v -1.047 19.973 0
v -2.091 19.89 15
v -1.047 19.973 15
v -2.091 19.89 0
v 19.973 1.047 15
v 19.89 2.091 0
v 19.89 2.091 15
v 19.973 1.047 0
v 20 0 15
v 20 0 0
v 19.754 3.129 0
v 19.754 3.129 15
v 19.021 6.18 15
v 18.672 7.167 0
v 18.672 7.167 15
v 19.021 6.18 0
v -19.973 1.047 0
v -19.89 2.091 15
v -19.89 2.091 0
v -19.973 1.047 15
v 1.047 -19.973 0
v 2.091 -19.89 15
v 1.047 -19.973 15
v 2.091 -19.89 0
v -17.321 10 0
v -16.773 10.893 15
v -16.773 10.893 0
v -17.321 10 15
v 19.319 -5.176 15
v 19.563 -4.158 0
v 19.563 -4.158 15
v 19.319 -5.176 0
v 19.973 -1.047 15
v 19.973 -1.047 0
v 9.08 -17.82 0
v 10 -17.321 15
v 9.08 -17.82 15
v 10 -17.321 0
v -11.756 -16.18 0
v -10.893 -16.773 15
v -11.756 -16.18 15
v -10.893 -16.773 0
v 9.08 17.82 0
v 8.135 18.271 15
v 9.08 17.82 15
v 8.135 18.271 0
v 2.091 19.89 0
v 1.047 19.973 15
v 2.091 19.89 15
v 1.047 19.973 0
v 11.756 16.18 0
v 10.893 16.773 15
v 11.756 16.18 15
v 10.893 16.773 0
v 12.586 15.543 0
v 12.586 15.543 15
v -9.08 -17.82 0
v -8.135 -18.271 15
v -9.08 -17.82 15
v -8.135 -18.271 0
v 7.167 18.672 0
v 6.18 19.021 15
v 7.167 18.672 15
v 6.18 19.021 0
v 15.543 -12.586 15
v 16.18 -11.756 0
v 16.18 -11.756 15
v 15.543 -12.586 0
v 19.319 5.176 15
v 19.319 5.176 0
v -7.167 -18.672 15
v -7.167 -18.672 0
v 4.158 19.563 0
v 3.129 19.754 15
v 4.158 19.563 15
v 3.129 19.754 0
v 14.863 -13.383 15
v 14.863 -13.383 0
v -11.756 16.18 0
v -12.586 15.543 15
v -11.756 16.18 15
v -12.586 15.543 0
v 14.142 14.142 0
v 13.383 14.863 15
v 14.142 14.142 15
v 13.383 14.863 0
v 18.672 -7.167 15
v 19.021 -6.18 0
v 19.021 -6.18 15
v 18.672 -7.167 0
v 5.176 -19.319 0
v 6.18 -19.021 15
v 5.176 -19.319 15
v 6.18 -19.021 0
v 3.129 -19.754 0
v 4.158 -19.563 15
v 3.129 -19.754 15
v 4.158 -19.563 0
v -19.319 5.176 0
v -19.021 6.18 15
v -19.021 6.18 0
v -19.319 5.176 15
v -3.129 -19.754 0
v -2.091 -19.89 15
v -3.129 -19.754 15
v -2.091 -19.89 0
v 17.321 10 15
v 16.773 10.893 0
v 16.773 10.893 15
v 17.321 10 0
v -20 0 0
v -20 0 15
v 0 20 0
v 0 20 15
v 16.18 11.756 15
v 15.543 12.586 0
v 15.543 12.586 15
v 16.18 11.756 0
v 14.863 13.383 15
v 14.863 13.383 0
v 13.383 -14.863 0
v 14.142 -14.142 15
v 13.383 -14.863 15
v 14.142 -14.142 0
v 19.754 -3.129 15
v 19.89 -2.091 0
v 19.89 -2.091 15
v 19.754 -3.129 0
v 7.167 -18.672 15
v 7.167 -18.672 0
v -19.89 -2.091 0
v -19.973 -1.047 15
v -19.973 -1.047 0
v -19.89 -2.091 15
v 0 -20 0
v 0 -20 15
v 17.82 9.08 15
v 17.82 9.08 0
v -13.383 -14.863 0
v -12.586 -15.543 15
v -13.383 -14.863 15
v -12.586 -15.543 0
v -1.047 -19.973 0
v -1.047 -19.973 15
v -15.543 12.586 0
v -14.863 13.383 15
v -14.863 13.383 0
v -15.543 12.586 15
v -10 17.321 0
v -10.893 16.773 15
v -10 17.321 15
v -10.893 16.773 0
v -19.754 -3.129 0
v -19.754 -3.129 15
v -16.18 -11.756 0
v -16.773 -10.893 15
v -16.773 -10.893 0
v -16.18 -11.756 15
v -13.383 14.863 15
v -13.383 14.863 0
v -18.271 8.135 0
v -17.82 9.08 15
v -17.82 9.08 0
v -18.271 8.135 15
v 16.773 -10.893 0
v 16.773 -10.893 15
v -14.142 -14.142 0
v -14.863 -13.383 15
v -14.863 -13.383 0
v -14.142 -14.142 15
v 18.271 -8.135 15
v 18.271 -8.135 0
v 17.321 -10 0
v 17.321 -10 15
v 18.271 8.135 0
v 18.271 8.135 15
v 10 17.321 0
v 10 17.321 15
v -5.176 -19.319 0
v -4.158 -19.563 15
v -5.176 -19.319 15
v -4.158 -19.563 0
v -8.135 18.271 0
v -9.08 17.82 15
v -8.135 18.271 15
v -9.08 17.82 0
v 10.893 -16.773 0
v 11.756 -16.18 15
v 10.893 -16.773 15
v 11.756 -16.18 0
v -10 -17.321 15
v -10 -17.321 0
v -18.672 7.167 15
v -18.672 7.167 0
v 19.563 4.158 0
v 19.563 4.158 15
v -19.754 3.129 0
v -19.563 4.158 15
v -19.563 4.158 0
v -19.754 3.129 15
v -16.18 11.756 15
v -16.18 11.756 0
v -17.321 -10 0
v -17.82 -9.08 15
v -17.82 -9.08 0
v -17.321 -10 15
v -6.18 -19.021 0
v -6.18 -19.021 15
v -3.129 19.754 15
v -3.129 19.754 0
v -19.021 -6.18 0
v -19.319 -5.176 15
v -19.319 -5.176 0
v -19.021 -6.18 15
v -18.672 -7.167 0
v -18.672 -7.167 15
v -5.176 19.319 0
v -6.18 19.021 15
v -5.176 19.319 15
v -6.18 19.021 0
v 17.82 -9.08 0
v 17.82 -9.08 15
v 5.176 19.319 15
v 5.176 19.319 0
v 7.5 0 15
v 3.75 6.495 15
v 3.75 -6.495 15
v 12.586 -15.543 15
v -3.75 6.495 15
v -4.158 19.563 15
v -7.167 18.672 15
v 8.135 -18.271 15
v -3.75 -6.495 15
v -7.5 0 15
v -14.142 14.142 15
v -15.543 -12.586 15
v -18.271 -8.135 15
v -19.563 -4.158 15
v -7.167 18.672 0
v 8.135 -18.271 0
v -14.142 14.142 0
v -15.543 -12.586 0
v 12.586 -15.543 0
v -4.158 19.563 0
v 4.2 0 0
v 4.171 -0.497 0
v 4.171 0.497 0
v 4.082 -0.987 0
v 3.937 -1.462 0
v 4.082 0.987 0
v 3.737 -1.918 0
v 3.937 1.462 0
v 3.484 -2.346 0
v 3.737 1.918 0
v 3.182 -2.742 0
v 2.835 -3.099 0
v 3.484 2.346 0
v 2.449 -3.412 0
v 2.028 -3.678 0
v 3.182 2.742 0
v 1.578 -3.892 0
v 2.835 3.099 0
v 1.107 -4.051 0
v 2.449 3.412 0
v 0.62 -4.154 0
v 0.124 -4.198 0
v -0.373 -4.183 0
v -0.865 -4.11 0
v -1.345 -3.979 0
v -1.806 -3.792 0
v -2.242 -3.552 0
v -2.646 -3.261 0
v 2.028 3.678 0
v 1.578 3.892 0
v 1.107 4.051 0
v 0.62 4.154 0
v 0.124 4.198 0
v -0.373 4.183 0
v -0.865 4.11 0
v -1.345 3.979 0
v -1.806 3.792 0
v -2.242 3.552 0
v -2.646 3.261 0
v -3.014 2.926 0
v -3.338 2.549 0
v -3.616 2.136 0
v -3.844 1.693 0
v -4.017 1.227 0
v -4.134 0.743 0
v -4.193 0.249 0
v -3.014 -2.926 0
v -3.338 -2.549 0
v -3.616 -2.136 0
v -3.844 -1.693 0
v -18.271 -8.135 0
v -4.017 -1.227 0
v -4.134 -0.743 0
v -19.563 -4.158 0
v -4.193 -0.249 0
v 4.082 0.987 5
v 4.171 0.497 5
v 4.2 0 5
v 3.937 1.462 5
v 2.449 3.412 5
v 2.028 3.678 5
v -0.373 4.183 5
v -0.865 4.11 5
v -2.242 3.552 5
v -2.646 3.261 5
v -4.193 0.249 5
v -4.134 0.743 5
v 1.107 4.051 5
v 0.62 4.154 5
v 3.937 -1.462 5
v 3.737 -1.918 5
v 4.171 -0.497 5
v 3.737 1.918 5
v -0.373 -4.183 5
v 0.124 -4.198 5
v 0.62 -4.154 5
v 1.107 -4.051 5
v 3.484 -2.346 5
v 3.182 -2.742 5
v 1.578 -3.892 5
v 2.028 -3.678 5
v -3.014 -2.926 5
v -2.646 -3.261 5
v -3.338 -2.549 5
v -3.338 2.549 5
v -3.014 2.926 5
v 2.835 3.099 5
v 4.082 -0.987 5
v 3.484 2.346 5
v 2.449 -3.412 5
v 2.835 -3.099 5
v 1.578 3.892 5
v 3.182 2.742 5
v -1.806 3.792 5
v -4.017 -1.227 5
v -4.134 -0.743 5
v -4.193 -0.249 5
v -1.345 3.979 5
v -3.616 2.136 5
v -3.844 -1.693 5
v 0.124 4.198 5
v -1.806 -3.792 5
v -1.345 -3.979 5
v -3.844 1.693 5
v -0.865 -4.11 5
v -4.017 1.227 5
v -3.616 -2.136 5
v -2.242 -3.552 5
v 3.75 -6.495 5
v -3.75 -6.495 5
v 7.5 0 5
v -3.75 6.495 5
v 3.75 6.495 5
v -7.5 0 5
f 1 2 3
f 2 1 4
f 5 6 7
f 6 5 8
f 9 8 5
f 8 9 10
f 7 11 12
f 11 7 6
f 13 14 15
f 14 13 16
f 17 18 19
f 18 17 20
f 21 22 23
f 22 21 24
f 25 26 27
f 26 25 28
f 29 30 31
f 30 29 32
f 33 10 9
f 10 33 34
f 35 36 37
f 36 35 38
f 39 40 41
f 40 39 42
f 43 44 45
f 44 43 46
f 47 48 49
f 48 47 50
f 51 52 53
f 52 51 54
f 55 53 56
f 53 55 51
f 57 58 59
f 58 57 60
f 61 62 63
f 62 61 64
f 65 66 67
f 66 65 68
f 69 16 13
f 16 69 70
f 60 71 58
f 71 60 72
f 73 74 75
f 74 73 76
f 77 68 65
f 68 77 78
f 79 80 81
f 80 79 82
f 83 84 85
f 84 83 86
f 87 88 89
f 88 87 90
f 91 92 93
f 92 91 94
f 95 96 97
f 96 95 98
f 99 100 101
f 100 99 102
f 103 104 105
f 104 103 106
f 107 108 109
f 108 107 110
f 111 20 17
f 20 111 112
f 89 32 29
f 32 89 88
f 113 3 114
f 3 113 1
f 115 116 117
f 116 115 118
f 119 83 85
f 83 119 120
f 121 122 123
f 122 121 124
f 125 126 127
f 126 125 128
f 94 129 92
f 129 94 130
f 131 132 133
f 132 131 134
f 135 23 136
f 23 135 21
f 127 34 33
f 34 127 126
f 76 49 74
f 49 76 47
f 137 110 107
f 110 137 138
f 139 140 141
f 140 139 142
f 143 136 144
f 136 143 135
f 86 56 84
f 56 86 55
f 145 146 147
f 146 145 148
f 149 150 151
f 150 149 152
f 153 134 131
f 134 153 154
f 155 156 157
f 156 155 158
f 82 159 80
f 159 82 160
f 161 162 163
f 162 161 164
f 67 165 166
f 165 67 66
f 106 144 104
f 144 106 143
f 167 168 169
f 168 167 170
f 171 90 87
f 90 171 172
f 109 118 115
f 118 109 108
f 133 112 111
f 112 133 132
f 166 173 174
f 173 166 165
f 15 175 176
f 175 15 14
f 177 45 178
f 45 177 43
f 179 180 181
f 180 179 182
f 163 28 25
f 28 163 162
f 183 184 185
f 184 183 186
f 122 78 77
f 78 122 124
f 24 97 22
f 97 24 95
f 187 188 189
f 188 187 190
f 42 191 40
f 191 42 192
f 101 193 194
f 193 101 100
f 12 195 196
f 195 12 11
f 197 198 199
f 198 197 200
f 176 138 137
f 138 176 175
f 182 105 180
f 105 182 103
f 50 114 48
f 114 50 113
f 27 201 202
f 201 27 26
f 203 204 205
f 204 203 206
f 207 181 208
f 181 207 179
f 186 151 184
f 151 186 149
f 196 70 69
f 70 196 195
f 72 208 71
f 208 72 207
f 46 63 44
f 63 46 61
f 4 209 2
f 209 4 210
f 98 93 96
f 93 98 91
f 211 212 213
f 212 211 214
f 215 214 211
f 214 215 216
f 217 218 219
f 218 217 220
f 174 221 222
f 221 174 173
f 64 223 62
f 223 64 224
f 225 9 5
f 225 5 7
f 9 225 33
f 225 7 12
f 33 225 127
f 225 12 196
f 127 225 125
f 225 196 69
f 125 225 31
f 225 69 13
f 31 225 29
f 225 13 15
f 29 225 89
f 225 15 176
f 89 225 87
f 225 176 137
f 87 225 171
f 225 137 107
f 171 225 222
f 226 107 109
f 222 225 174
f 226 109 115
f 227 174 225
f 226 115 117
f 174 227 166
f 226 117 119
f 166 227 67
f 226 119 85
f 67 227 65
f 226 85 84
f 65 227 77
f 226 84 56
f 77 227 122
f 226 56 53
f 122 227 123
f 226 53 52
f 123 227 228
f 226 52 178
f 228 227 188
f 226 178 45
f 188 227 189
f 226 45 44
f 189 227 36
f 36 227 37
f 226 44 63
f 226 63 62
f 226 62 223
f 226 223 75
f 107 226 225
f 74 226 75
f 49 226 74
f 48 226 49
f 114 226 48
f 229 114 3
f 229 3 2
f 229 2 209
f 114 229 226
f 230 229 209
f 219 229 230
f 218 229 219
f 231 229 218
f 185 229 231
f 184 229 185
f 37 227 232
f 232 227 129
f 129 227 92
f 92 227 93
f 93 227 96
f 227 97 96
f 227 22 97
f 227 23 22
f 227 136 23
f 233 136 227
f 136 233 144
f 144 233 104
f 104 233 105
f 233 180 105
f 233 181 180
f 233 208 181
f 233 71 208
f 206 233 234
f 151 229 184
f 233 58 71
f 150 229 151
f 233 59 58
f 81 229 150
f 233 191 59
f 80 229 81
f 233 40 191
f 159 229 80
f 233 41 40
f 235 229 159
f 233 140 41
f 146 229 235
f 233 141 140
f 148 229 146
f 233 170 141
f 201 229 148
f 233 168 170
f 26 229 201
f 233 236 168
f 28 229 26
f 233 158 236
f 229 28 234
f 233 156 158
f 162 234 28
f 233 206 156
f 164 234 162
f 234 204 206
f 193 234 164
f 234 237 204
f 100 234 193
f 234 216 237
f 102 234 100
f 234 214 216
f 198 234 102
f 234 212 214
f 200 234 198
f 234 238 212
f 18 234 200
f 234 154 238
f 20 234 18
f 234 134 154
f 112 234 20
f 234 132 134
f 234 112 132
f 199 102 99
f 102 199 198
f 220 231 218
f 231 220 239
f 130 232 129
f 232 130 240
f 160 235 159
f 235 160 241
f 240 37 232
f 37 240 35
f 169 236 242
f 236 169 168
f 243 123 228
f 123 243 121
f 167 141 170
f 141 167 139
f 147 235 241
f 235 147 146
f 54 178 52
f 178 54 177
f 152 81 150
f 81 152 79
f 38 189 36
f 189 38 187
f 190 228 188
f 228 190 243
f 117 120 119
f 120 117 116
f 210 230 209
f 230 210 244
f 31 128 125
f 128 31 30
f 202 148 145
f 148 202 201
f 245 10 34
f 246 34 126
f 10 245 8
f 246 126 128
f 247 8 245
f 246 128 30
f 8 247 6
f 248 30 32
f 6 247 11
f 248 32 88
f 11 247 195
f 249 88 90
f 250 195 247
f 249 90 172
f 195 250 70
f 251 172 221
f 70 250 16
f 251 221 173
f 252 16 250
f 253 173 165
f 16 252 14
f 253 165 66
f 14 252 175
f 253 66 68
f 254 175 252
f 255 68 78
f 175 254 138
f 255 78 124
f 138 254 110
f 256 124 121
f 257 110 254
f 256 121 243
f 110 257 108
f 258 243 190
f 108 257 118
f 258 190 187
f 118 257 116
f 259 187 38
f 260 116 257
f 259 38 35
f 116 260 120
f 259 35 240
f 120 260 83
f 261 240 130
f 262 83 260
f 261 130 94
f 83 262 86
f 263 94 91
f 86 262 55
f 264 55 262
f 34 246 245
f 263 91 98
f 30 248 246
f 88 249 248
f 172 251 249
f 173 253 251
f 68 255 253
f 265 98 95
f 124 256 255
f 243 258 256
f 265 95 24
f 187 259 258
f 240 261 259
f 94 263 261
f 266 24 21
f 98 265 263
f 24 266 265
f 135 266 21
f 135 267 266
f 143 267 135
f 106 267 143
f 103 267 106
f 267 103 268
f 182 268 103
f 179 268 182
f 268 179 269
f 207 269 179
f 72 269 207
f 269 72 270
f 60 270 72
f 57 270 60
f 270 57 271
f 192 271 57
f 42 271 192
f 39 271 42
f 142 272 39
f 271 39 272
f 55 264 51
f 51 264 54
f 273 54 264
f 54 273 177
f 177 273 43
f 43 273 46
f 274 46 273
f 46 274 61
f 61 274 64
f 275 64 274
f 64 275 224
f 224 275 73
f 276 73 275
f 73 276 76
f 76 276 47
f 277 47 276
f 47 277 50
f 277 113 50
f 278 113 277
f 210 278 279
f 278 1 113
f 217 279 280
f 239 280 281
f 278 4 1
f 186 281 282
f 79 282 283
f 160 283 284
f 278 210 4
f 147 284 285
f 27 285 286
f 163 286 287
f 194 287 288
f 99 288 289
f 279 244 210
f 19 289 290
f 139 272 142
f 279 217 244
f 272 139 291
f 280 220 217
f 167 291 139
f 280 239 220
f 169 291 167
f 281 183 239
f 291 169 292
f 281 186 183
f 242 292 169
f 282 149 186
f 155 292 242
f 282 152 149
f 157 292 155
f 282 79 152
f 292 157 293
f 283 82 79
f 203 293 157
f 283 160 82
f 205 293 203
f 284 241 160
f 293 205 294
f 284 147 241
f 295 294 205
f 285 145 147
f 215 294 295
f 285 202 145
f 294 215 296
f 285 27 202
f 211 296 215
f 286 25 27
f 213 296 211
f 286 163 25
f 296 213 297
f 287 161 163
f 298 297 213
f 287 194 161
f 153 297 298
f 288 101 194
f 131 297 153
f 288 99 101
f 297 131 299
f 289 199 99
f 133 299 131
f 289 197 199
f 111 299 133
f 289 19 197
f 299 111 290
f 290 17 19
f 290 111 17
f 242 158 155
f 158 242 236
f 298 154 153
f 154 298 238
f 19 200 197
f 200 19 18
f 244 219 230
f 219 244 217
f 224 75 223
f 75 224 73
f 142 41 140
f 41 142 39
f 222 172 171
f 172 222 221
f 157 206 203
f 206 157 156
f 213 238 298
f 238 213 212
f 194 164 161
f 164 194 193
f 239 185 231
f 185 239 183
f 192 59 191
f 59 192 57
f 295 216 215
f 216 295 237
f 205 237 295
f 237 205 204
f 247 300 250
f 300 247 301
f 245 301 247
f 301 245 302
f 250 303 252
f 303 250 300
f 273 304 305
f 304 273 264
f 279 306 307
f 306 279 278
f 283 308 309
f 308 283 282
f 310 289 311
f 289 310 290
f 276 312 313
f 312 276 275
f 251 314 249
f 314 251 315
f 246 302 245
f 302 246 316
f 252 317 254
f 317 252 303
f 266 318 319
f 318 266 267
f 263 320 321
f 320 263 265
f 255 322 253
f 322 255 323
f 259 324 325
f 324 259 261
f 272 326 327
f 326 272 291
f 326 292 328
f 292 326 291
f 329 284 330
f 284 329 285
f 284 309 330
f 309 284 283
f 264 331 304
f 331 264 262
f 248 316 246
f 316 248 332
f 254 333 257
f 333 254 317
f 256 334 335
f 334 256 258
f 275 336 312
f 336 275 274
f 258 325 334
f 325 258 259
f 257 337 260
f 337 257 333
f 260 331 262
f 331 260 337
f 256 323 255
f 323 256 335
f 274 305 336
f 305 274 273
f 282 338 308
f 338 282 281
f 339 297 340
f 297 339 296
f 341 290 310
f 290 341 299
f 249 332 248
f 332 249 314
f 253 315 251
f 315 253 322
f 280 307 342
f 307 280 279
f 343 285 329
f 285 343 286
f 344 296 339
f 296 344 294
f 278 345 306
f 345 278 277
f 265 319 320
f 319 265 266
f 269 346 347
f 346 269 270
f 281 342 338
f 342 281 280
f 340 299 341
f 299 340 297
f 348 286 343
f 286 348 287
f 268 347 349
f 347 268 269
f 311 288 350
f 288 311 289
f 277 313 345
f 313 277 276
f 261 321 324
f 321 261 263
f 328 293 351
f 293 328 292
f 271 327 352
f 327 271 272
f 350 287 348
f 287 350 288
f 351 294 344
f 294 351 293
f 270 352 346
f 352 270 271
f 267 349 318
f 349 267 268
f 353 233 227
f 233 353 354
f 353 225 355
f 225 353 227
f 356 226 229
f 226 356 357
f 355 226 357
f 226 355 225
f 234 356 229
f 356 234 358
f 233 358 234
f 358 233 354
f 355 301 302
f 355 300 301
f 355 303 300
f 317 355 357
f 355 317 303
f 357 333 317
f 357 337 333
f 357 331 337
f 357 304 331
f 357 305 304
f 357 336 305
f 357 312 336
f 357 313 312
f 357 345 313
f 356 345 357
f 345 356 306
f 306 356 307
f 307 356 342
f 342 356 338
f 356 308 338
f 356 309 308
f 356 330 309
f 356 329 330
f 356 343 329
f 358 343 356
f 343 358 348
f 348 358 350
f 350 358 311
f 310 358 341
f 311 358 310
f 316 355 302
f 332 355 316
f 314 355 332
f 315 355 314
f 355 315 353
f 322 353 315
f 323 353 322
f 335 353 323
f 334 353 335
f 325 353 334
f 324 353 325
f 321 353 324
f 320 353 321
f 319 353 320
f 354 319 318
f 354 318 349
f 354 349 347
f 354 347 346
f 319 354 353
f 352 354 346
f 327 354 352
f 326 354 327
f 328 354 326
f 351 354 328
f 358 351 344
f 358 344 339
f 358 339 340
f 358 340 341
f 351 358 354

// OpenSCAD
$fs=$fs/4;
$fa=$fa/4;

h=15;

h2 = 10;

difference(){
    cylinder(h,20,20);
    cylinder(40,4.2,4.2,center=true);
    translate([0,0,h-h2])cylinder(h+2,15/2, 15/2, $fn=6);
}
